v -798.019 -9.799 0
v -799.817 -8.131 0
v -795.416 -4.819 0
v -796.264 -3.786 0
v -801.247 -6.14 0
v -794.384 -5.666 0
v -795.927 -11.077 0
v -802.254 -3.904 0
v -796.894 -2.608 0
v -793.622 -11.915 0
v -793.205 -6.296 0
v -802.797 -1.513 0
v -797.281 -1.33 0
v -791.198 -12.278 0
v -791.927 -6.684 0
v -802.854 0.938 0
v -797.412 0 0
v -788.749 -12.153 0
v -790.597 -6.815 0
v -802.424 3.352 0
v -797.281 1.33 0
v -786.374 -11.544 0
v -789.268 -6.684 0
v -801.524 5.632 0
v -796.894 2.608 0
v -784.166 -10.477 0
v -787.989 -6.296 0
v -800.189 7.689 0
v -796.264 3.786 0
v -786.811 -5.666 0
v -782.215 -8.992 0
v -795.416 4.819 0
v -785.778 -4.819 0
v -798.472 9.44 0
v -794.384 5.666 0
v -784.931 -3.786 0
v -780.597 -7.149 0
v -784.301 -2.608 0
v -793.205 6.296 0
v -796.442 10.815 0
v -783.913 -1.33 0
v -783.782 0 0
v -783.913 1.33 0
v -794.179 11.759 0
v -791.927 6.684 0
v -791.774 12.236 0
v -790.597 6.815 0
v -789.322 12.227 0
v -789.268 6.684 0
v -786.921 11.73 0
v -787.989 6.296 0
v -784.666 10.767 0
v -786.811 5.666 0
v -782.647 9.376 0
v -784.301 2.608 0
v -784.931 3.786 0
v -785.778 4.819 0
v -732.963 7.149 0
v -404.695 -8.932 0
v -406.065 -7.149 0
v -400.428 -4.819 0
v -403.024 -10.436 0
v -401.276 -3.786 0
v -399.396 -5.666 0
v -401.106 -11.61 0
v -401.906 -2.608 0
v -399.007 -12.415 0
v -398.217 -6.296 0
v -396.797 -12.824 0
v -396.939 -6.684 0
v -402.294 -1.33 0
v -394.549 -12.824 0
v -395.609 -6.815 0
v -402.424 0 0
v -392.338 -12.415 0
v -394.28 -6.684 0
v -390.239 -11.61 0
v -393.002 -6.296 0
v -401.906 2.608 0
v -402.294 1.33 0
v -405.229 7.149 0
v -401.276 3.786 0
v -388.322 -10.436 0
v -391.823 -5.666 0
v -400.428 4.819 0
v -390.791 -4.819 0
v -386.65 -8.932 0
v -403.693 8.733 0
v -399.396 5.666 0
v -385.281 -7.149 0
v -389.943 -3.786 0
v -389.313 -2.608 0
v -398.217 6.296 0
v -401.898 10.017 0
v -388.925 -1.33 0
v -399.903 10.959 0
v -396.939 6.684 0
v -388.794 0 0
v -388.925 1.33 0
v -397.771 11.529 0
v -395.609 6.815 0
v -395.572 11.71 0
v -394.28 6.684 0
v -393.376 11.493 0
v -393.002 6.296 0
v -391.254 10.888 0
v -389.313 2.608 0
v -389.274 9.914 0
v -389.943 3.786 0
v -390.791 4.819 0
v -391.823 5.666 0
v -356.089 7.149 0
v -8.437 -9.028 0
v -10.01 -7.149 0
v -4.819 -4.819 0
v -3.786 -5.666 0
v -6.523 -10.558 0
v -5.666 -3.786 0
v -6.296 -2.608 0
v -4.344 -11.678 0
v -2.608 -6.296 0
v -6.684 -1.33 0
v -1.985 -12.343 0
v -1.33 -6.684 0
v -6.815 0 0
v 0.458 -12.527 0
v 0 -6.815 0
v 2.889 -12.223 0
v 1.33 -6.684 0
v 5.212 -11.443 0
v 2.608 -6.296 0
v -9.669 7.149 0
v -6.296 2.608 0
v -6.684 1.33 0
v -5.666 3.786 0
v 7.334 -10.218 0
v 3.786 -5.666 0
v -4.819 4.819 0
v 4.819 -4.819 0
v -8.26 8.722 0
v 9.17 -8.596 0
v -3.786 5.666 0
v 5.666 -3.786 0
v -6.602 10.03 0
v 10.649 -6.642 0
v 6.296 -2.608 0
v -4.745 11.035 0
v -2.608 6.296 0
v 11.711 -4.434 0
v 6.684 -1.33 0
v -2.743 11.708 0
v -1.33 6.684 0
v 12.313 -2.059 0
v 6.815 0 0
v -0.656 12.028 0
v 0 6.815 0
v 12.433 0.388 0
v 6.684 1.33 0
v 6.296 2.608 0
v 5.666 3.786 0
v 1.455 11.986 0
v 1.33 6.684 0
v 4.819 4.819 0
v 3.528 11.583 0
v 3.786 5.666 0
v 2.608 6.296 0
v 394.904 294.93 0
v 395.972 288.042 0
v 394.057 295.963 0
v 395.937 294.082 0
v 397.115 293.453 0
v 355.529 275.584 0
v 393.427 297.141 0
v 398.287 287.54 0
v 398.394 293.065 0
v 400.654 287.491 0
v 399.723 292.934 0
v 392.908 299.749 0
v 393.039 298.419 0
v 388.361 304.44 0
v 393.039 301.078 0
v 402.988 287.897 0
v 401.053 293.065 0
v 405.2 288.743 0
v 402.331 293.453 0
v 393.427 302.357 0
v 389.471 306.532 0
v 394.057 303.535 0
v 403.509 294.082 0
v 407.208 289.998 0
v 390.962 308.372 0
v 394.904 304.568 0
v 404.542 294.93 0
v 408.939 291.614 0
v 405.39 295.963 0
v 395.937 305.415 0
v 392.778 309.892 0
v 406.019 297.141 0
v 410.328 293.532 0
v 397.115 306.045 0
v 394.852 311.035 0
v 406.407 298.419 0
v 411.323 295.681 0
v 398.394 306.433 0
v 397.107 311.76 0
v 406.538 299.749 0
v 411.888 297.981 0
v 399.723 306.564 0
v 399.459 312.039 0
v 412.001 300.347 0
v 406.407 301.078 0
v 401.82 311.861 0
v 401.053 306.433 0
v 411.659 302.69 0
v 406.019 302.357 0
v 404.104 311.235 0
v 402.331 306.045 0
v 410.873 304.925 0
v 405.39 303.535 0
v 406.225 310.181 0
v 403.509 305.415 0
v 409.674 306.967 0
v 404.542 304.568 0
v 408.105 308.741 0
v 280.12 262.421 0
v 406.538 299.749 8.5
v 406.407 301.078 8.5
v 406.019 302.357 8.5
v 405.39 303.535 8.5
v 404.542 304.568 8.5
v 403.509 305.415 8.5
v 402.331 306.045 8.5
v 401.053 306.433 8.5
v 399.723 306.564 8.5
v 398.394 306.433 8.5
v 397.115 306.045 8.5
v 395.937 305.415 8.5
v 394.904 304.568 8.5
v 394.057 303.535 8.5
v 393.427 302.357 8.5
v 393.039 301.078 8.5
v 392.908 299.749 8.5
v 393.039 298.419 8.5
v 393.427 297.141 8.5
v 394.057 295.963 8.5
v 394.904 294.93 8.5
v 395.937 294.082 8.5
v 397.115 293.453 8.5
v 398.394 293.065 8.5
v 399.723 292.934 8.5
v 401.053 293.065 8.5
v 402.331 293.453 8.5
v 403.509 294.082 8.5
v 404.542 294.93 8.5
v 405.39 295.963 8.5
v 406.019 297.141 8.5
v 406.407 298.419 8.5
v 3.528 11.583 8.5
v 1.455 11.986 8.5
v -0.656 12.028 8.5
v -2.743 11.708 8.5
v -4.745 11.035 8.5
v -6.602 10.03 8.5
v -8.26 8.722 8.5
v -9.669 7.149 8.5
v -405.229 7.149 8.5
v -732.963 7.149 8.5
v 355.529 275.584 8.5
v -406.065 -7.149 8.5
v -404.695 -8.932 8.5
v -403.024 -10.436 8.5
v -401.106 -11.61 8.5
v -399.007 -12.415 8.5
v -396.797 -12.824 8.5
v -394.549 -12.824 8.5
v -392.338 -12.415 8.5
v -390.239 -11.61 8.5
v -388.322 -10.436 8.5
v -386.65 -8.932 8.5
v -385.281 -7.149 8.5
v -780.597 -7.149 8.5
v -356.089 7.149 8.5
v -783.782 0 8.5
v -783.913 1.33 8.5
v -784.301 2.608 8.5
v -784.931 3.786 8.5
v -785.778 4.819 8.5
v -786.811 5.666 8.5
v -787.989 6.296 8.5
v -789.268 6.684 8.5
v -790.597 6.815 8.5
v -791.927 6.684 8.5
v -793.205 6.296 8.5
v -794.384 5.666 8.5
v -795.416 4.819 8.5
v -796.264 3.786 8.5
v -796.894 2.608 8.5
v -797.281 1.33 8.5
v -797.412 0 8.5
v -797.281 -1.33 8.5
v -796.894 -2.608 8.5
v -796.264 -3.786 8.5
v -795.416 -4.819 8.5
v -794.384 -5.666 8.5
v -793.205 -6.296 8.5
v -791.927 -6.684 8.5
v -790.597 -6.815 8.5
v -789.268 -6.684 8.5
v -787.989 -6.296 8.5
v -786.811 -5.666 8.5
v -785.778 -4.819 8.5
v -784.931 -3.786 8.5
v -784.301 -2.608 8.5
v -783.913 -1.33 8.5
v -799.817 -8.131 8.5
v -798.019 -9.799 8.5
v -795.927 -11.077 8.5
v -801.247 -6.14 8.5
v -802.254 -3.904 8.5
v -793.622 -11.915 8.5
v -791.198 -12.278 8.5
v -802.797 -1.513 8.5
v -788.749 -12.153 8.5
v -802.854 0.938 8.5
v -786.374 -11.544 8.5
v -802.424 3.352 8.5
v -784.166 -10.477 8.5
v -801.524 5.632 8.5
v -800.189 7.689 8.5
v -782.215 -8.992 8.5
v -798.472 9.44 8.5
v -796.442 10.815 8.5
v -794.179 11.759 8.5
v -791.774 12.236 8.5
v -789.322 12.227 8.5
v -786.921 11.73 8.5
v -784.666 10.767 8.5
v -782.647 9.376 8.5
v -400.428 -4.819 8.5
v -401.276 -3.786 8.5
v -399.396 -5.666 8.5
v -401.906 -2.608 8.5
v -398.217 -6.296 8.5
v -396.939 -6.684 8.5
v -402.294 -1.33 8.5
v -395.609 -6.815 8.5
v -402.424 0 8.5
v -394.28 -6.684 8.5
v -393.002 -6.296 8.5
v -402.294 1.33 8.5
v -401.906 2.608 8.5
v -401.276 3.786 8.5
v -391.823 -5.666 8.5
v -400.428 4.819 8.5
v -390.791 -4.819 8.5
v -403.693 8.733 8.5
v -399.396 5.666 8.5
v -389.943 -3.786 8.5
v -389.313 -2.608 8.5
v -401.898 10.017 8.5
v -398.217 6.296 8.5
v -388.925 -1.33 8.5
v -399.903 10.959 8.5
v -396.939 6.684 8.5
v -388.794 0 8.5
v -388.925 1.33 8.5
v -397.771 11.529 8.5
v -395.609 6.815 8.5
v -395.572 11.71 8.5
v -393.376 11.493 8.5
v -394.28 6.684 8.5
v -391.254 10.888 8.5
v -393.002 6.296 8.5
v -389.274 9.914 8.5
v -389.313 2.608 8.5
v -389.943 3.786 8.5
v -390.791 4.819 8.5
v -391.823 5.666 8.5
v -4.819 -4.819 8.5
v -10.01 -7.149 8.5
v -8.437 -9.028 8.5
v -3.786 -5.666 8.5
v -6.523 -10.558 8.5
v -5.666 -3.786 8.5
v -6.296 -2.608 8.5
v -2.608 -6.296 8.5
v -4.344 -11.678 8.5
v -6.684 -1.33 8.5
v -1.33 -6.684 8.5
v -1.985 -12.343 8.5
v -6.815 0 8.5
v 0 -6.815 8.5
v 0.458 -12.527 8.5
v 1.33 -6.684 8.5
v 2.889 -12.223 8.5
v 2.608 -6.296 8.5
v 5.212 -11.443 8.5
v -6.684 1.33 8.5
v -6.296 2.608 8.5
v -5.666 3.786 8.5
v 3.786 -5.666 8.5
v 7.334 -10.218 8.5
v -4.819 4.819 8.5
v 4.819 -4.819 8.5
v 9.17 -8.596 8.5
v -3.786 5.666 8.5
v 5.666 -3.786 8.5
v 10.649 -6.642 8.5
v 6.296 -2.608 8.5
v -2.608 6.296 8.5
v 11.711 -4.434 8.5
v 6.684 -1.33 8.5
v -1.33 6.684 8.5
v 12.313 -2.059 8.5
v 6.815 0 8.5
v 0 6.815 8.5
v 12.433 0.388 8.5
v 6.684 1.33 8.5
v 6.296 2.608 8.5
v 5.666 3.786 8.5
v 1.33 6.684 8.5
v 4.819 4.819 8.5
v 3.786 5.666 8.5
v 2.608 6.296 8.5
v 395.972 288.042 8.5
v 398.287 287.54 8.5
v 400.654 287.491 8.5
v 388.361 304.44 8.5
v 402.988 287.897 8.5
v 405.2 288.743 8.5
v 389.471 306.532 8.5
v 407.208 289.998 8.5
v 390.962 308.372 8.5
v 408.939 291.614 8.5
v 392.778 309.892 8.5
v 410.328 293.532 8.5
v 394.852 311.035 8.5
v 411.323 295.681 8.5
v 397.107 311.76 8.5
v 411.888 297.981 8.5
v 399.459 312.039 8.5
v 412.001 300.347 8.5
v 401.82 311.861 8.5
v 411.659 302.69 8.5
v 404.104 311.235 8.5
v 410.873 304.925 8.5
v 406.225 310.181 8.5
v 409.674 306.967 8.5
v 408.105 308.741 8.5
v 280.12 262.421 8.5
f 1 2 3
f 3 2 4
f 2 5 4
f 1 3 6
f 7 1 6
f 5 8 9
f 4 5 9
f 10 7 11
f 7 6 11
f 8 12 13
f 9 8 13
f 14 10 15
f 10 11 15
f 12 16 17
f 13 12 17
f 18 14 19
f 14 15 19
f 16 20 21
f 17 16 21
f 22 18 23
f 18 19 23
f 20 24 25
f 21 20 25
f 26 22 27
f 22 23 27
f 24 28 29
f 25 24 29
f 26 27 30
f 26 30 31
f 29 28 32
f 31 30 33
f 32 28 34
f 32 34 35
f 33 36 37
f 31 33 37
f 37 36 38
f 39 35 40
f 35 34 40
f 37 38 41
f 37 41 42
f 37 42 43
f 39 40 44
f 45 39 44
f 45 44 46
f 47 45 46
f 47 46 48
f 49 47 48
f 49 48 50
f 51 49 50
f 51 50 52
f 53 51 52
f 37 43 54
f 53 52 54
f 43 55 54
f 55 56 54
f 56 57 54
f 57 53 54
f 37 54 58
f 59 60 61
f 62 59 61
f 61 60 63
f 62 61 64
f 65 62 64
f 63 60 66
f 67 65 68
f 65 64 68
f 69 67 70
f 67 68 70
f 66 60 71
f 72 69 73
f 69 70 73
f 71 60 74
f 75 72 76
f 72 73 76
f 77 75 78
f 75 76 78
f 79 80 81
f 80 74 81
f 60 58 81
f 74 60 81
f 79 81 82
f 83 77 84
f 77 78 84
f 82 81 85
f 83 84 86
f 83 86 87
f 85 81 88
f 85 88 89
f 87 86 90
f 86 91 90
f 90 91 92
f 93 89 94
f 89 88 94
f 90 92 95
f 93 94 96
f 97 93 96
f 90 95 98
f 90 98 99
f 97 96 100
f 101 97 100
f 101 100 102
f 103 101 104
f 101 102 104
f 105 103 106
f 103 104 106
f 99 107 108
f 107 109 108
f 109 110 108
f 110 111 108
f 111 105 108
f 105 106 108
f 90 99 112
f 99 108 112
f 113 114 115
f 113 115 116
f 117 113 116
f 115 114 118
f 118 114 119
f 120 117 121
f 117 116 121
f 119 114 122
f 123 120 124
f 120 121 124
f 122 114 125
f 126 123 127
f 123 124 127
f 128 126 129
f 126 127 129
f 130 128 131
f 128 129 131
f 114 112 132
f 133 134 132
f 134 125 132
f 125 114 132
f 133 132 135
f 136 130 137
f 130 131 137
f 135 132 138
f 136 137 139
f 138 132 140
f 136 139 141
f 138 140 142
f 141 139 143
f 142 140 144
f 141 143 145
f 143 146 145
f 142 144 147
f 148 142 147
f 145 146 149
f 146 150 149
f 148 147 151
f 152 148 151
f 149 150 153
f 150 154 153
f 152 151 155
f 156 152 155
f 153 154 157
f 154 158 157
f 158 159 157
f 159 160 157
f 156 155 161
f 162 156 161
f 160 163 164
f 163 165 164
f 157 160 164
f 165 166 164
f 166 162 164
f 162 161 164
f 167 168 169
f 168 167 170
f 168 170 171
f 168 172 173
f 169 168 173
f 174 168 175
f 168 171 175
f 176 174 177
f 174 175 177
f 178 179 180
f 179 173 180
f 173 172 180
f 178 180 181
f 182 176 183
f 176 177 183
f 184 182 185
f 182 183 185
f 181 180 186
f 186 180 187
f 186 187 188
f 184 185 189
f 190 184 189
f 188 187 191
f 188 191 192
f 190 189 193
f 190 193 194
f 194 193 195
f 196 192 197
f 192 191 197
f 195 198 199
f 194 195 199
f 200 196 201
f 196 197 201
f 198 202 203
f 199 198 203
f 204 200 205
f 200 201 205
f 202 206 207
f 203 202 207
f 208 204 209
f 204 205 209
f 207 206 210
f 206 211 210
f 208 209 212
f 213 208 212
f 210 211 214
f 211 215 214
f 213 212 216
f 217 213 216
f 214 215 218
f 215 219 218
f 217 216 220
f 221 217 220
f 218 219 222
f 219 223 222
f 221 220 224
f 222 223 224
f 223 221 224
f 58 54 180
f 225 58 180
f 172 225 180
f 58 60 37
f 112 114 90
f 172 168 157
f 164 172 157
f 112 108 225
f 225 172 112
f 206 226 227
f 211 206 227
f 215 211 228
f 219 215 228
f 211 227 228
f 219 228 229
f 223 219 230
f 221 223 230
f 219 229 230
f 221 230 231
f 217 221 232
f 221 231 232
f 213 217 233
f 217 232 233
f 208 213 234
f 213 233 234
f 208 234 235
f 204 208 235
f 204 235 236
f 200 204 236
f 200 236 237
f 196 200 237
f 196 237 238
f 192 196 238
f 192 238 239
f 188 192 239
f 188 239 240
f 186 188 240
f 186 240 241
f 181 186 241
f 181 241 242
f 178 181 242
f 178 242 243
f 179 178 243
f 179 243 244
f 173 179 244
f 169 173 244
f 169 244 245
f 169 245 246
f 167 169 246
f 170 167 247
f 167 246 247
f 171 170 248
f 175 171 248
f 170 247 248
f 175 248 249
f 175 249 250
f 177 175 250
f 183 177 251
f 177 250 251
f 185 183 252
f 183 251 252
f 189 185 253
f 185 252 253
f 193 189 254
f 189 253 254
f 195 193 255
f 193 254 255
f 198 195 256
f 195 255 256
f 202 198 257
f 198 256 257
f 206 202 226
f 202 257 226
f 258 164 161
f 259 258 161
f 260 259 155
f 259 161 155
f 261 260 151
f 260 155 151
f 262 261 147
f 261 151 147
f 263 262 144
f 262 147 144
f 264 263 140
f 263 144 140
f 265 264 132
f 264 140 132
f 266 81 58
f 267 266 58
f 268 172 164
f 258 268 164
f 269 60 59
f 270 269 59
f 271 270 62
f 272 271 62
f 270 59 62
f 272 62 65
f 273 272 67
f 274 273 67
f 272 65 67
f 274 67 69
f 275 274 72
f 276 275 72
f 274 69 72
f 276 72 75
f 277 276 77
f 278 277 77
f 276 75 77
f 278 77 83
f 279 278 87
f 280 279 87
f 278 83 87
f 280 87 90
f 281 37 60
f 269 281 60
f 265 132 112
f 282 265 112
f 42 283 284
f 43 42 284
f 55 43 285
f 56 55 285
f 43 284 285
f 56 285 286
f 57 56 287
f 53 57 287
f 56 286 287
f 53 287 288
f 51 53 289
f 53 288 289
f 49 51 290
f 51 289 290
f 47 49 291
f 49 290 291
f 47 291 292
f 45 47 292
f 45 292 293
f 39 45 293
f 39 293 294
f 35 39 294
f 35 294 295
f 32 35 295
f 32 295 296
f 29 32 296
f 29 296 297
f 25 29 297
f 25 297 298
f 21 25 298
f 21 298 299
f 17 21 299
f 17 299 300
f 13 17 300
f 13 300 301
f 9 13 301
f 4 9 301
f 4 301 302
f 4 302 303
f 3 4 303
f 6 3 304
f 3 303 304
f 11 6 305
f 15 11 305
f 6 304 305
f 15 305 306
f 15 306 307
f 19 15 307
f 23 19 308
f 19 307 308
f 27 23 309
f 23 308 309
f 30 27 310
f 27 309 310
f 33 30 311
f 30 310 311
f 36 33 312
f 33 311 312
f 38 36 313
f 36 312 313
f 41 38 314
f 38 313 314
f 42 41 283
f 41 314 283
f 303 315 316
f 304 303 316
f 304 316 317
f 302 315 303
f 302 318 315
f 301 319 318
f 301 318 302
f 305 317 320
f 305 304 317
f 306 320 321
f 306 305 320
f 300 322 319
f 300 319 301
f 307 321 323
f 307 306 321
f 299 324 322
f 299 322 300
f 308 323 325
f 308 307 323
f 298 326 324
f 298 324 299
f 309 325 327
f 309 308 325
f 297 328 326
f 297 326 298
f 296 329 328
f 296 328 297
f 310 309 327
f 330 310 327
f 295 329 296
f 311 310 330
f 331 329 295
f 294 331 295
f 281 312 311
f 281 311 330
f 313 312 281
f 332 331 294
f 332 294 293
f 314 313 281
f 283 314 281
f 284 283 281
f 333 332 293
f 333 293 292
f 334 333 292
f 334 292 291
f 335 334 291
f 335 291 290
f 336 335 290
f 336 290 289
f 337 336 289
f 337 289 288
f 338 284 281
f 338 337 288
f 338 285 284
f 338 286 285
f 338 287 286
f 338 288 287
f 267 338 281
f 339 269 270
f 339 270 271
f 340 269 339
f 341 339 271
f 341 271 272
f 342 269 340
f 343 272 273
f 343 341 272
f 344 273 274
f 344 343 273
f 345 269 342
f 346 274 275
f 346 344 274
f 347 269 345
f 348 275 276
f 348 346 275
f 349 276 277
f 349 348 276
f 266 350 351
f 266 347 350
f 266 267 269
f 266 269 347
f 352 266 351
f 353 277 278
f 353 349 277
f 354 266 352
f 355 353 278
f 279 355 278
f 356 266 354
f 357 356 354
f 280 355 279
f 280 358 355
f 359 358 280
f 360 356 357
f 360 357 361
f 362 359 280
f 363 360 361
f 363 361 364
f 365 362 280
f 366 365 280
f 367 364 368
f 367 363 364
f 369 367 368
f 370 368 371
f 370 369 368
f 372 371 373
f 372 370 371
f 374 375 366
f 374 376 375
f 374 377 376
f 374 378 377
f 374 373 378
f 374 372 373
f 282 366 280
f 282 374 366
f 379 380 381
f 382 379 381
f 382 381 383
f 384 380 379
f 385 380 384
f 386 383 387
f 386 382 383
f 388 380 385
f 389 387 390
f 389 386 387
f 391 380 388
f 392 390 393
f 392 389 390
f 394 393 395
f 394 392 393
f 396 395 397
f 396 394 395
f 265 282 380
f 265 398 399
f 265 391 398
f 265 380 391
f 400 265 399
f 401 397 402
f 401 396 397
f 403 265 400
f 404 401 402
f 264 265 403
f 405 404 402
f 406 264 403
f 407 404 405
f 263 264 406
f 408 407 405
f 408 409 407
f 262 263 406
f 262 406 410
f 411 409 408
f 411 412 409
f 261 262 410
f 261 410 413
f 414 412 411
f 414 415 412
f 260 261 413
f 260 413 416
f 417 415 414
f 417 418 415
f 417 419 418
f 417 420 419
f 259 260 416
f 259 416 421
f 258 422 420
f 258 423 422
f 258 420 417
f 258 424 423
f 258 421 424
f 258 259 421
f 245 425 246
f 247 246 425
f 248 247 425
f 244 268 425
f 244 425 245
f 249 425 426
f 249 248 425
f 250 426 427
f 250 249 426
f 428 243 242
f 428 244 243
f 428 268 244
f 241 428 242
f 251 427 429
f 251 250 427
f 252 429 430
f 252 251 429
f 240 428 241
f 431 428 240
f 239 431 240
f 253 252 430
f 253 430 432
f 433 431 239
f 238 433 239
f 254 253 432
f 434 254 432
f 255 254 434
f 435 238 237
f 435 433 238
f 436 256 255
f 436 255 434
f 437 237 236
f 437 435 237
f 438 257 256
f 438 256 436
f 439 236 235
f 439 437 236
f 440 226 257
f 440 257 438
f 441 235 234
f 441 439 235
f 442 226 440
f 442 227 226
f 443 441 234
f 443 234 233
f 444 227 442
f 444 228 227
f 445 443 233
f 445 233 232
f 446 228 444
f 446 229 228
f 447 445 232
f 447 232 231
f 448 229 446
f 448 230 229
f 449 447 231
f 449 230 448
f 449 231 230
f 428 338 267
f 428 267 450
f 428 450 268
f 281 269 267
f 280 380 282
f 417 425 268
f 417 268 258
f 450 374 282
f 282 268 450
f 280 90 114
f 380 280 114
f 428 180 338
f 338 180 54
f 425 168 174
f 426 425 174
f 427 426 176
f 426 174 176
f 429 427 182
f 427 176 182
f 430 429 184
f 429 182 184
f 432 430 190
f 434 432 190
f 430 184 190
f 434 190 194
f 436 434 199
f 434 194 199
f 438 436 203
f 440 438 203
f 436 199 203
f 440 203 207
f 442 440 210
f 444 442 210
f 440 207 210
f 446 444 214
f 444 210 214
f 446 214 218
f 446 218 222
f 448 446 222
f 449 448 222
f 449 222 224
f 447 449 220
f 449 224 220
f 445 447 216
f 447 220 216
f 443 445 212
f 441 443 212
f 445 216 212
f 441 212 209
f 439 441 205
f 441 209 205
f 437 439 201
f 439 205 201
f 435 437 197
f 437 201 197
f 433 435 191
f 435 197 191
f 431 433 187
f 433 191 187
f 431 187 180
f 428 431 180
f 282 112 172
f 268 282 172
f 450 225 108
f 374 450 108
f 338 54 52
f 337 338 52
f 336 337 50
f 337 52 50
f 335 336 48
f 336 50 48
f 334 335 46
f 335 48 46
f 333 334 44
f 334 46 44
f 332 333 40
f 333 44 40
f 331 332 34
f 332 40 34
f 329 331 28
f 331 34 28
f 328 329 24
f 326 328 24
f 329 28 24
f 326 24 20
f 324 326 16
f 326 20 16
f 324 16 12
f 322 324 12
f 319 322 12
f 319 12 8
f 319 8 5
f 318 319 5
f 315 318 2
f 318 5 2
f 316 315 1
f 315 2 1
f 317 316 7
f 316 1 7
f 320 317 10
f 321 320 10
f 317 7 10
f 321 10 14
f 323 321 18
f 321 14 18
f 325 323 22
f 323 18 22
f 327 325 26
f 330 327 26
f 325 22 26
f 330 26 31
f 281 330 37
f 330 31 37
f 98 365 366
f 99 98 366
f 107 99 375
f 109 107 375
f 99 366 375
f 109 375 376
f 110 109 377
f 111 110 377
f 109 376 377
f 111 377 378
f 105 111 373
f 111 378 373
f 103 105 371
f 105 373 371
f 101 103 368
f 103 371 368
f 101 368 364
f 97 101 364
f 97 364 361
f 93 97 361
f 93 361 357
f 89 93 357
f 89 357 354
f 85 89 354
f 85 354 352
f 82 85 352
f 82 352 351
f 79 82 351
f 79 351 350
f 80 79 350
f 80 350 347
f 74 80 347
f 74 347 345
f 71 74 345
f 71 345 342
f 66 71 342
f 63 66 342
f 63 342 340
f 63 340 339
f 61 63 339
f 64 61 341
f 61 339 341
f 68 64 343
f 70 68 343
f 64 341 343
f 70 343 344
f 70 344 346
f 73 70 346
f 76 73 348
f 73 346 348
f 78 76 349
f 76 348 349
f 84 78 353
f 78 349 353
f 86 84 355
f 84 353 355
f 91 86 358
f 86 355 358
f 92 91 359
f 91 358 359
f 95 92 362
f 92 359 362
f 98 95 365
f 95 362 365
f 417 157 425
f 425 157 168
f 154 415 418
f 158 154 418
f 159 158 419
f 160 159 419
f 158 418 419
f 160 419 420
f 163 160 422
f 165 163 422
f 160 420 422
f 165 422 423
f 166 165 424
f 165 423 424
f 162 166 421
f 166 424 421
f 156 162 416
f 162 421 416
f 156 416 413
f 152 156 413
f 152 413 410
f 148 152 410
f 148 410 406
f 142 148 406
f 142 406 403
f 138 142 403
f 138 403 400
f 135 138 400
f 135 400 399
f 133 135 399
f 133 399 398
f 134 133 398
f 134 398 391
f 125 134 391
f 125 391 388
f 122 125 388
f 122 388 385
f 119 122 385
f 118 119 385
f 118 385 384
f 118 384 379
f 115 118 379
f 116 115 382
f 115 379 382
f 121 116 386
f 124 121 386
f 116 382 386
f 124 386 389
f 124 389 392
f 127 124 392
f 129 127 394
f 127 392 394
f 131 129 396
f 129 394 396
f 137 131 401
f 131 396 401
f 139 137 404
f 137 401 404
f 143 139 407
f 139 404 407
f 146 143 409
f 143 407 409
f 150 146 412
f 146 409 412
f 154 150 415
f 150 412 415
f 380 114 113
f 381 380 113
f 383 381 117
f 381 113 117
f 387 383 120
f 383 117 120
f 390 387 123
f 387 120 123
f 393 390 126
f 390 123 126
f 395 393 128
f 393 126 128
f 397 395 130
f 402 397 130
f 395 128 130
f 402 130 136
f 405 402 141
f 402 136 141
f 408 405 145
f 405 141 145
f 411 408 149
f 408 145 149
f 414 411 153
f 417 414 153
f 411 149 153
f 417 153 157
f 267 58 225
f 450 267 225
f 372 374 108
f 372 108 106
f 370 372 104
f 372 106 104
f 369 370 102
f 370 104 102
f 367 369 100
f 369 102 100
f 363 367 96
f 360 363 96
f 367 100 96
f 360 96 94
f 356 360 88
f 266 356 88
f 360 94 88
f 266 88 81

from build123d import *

# Parameters (mm, degrees)
BOSS_EXTRUDE3_DEPTH = 8.5
SKETCH2_R           = 6.815
CUT_EXTRUDE1_DEPTH  = 862.437728783


with BuildPart() as part:
    # Sketch1 → Boss-Extrude3 (new body)
    with BuildSketch(Plane.XY):
        with BuildLine():
            ThreePointArc((395.972037607, 288.042278205), (410.873208436, 304.924541602), (388.360524278, 304.440019711))
            Line((388.360524278, 304.440019711), (-782.647332163, 9.376075193))
            ThreePointArc((-782.647332163, 9.376075193), (-802.796708748, -1.513309192), (-780.597372059, -7.1494))
            Line((-780.597372059, -7.1494), (-406.064833976, -7.1494))
            ThreePointArc((-406.064833976, -7.1494), (-395.672766052, -12.875746118), (-385.280698128, -7.1494))
            Line((-385.280698128, -7.1494), (-10.009831376, -7.1494))
            ThreePointArc((-10.009831376, -7.1494), (4.069984623, -11.891378206), (12.43312578, 0.388094335))
            Line((12.43312578, 0.388094335), (395.972037607, 288.042278205))
        make_face()
        with BuildLine():
            Line((-732.963454166, 7.1494), (280.120400531, 262.420546688))
            Line((280.120400531, 262.420546688), (-389.274490601, 9.913569288))
            ThreePointArc((-389.274490601, 9.913569288), (-397.771252158, 11.52949585), (-405.229196644, 7.1494))
            Line((-405.229196644, 7.1494), (-732.963454166, 7.1494))
        make_face(mode=Mode.SUBTRACT)
        with BuildLine():
            Line((355.529405997, 275.583804497), (3.528425073, 11.583068805))
            ThreePointArc((3.528425073, 11.583068805), (-3.75849008, 11.414643851), (-9.669090245, 7.1494))
            Line((-9.669090245, 7.1494), (-356.08902461, 7.1494))
            Line((-356.08902461, 7.1494), (355.529405997, 275.583804497))
        make_face(mode=Mode.SUBTRACT)
    extrude(amount=BOSS_EXTRUDE3_DEPTH)

    # Sketch2 → Cut-Extrude1 (cut, through all)
    with BuildSketch(Plane.XY.offset(8.5)):
        Circle(SKETCH2_R)
        with Locations((399.723044466, 299.74885191)):
            Circle(SKETCH2_R)
        with Locations((-395.609498981, 0)):
            Circle(SKETCH2_R)
        with Locations((-790.597372059, 0)):
            Circle(SKETCH2_R)
    extrude(amount=-CUT_EXTRUDE1_DEPTH, mode=Mode.SUBTRACT)


solid = part.part
